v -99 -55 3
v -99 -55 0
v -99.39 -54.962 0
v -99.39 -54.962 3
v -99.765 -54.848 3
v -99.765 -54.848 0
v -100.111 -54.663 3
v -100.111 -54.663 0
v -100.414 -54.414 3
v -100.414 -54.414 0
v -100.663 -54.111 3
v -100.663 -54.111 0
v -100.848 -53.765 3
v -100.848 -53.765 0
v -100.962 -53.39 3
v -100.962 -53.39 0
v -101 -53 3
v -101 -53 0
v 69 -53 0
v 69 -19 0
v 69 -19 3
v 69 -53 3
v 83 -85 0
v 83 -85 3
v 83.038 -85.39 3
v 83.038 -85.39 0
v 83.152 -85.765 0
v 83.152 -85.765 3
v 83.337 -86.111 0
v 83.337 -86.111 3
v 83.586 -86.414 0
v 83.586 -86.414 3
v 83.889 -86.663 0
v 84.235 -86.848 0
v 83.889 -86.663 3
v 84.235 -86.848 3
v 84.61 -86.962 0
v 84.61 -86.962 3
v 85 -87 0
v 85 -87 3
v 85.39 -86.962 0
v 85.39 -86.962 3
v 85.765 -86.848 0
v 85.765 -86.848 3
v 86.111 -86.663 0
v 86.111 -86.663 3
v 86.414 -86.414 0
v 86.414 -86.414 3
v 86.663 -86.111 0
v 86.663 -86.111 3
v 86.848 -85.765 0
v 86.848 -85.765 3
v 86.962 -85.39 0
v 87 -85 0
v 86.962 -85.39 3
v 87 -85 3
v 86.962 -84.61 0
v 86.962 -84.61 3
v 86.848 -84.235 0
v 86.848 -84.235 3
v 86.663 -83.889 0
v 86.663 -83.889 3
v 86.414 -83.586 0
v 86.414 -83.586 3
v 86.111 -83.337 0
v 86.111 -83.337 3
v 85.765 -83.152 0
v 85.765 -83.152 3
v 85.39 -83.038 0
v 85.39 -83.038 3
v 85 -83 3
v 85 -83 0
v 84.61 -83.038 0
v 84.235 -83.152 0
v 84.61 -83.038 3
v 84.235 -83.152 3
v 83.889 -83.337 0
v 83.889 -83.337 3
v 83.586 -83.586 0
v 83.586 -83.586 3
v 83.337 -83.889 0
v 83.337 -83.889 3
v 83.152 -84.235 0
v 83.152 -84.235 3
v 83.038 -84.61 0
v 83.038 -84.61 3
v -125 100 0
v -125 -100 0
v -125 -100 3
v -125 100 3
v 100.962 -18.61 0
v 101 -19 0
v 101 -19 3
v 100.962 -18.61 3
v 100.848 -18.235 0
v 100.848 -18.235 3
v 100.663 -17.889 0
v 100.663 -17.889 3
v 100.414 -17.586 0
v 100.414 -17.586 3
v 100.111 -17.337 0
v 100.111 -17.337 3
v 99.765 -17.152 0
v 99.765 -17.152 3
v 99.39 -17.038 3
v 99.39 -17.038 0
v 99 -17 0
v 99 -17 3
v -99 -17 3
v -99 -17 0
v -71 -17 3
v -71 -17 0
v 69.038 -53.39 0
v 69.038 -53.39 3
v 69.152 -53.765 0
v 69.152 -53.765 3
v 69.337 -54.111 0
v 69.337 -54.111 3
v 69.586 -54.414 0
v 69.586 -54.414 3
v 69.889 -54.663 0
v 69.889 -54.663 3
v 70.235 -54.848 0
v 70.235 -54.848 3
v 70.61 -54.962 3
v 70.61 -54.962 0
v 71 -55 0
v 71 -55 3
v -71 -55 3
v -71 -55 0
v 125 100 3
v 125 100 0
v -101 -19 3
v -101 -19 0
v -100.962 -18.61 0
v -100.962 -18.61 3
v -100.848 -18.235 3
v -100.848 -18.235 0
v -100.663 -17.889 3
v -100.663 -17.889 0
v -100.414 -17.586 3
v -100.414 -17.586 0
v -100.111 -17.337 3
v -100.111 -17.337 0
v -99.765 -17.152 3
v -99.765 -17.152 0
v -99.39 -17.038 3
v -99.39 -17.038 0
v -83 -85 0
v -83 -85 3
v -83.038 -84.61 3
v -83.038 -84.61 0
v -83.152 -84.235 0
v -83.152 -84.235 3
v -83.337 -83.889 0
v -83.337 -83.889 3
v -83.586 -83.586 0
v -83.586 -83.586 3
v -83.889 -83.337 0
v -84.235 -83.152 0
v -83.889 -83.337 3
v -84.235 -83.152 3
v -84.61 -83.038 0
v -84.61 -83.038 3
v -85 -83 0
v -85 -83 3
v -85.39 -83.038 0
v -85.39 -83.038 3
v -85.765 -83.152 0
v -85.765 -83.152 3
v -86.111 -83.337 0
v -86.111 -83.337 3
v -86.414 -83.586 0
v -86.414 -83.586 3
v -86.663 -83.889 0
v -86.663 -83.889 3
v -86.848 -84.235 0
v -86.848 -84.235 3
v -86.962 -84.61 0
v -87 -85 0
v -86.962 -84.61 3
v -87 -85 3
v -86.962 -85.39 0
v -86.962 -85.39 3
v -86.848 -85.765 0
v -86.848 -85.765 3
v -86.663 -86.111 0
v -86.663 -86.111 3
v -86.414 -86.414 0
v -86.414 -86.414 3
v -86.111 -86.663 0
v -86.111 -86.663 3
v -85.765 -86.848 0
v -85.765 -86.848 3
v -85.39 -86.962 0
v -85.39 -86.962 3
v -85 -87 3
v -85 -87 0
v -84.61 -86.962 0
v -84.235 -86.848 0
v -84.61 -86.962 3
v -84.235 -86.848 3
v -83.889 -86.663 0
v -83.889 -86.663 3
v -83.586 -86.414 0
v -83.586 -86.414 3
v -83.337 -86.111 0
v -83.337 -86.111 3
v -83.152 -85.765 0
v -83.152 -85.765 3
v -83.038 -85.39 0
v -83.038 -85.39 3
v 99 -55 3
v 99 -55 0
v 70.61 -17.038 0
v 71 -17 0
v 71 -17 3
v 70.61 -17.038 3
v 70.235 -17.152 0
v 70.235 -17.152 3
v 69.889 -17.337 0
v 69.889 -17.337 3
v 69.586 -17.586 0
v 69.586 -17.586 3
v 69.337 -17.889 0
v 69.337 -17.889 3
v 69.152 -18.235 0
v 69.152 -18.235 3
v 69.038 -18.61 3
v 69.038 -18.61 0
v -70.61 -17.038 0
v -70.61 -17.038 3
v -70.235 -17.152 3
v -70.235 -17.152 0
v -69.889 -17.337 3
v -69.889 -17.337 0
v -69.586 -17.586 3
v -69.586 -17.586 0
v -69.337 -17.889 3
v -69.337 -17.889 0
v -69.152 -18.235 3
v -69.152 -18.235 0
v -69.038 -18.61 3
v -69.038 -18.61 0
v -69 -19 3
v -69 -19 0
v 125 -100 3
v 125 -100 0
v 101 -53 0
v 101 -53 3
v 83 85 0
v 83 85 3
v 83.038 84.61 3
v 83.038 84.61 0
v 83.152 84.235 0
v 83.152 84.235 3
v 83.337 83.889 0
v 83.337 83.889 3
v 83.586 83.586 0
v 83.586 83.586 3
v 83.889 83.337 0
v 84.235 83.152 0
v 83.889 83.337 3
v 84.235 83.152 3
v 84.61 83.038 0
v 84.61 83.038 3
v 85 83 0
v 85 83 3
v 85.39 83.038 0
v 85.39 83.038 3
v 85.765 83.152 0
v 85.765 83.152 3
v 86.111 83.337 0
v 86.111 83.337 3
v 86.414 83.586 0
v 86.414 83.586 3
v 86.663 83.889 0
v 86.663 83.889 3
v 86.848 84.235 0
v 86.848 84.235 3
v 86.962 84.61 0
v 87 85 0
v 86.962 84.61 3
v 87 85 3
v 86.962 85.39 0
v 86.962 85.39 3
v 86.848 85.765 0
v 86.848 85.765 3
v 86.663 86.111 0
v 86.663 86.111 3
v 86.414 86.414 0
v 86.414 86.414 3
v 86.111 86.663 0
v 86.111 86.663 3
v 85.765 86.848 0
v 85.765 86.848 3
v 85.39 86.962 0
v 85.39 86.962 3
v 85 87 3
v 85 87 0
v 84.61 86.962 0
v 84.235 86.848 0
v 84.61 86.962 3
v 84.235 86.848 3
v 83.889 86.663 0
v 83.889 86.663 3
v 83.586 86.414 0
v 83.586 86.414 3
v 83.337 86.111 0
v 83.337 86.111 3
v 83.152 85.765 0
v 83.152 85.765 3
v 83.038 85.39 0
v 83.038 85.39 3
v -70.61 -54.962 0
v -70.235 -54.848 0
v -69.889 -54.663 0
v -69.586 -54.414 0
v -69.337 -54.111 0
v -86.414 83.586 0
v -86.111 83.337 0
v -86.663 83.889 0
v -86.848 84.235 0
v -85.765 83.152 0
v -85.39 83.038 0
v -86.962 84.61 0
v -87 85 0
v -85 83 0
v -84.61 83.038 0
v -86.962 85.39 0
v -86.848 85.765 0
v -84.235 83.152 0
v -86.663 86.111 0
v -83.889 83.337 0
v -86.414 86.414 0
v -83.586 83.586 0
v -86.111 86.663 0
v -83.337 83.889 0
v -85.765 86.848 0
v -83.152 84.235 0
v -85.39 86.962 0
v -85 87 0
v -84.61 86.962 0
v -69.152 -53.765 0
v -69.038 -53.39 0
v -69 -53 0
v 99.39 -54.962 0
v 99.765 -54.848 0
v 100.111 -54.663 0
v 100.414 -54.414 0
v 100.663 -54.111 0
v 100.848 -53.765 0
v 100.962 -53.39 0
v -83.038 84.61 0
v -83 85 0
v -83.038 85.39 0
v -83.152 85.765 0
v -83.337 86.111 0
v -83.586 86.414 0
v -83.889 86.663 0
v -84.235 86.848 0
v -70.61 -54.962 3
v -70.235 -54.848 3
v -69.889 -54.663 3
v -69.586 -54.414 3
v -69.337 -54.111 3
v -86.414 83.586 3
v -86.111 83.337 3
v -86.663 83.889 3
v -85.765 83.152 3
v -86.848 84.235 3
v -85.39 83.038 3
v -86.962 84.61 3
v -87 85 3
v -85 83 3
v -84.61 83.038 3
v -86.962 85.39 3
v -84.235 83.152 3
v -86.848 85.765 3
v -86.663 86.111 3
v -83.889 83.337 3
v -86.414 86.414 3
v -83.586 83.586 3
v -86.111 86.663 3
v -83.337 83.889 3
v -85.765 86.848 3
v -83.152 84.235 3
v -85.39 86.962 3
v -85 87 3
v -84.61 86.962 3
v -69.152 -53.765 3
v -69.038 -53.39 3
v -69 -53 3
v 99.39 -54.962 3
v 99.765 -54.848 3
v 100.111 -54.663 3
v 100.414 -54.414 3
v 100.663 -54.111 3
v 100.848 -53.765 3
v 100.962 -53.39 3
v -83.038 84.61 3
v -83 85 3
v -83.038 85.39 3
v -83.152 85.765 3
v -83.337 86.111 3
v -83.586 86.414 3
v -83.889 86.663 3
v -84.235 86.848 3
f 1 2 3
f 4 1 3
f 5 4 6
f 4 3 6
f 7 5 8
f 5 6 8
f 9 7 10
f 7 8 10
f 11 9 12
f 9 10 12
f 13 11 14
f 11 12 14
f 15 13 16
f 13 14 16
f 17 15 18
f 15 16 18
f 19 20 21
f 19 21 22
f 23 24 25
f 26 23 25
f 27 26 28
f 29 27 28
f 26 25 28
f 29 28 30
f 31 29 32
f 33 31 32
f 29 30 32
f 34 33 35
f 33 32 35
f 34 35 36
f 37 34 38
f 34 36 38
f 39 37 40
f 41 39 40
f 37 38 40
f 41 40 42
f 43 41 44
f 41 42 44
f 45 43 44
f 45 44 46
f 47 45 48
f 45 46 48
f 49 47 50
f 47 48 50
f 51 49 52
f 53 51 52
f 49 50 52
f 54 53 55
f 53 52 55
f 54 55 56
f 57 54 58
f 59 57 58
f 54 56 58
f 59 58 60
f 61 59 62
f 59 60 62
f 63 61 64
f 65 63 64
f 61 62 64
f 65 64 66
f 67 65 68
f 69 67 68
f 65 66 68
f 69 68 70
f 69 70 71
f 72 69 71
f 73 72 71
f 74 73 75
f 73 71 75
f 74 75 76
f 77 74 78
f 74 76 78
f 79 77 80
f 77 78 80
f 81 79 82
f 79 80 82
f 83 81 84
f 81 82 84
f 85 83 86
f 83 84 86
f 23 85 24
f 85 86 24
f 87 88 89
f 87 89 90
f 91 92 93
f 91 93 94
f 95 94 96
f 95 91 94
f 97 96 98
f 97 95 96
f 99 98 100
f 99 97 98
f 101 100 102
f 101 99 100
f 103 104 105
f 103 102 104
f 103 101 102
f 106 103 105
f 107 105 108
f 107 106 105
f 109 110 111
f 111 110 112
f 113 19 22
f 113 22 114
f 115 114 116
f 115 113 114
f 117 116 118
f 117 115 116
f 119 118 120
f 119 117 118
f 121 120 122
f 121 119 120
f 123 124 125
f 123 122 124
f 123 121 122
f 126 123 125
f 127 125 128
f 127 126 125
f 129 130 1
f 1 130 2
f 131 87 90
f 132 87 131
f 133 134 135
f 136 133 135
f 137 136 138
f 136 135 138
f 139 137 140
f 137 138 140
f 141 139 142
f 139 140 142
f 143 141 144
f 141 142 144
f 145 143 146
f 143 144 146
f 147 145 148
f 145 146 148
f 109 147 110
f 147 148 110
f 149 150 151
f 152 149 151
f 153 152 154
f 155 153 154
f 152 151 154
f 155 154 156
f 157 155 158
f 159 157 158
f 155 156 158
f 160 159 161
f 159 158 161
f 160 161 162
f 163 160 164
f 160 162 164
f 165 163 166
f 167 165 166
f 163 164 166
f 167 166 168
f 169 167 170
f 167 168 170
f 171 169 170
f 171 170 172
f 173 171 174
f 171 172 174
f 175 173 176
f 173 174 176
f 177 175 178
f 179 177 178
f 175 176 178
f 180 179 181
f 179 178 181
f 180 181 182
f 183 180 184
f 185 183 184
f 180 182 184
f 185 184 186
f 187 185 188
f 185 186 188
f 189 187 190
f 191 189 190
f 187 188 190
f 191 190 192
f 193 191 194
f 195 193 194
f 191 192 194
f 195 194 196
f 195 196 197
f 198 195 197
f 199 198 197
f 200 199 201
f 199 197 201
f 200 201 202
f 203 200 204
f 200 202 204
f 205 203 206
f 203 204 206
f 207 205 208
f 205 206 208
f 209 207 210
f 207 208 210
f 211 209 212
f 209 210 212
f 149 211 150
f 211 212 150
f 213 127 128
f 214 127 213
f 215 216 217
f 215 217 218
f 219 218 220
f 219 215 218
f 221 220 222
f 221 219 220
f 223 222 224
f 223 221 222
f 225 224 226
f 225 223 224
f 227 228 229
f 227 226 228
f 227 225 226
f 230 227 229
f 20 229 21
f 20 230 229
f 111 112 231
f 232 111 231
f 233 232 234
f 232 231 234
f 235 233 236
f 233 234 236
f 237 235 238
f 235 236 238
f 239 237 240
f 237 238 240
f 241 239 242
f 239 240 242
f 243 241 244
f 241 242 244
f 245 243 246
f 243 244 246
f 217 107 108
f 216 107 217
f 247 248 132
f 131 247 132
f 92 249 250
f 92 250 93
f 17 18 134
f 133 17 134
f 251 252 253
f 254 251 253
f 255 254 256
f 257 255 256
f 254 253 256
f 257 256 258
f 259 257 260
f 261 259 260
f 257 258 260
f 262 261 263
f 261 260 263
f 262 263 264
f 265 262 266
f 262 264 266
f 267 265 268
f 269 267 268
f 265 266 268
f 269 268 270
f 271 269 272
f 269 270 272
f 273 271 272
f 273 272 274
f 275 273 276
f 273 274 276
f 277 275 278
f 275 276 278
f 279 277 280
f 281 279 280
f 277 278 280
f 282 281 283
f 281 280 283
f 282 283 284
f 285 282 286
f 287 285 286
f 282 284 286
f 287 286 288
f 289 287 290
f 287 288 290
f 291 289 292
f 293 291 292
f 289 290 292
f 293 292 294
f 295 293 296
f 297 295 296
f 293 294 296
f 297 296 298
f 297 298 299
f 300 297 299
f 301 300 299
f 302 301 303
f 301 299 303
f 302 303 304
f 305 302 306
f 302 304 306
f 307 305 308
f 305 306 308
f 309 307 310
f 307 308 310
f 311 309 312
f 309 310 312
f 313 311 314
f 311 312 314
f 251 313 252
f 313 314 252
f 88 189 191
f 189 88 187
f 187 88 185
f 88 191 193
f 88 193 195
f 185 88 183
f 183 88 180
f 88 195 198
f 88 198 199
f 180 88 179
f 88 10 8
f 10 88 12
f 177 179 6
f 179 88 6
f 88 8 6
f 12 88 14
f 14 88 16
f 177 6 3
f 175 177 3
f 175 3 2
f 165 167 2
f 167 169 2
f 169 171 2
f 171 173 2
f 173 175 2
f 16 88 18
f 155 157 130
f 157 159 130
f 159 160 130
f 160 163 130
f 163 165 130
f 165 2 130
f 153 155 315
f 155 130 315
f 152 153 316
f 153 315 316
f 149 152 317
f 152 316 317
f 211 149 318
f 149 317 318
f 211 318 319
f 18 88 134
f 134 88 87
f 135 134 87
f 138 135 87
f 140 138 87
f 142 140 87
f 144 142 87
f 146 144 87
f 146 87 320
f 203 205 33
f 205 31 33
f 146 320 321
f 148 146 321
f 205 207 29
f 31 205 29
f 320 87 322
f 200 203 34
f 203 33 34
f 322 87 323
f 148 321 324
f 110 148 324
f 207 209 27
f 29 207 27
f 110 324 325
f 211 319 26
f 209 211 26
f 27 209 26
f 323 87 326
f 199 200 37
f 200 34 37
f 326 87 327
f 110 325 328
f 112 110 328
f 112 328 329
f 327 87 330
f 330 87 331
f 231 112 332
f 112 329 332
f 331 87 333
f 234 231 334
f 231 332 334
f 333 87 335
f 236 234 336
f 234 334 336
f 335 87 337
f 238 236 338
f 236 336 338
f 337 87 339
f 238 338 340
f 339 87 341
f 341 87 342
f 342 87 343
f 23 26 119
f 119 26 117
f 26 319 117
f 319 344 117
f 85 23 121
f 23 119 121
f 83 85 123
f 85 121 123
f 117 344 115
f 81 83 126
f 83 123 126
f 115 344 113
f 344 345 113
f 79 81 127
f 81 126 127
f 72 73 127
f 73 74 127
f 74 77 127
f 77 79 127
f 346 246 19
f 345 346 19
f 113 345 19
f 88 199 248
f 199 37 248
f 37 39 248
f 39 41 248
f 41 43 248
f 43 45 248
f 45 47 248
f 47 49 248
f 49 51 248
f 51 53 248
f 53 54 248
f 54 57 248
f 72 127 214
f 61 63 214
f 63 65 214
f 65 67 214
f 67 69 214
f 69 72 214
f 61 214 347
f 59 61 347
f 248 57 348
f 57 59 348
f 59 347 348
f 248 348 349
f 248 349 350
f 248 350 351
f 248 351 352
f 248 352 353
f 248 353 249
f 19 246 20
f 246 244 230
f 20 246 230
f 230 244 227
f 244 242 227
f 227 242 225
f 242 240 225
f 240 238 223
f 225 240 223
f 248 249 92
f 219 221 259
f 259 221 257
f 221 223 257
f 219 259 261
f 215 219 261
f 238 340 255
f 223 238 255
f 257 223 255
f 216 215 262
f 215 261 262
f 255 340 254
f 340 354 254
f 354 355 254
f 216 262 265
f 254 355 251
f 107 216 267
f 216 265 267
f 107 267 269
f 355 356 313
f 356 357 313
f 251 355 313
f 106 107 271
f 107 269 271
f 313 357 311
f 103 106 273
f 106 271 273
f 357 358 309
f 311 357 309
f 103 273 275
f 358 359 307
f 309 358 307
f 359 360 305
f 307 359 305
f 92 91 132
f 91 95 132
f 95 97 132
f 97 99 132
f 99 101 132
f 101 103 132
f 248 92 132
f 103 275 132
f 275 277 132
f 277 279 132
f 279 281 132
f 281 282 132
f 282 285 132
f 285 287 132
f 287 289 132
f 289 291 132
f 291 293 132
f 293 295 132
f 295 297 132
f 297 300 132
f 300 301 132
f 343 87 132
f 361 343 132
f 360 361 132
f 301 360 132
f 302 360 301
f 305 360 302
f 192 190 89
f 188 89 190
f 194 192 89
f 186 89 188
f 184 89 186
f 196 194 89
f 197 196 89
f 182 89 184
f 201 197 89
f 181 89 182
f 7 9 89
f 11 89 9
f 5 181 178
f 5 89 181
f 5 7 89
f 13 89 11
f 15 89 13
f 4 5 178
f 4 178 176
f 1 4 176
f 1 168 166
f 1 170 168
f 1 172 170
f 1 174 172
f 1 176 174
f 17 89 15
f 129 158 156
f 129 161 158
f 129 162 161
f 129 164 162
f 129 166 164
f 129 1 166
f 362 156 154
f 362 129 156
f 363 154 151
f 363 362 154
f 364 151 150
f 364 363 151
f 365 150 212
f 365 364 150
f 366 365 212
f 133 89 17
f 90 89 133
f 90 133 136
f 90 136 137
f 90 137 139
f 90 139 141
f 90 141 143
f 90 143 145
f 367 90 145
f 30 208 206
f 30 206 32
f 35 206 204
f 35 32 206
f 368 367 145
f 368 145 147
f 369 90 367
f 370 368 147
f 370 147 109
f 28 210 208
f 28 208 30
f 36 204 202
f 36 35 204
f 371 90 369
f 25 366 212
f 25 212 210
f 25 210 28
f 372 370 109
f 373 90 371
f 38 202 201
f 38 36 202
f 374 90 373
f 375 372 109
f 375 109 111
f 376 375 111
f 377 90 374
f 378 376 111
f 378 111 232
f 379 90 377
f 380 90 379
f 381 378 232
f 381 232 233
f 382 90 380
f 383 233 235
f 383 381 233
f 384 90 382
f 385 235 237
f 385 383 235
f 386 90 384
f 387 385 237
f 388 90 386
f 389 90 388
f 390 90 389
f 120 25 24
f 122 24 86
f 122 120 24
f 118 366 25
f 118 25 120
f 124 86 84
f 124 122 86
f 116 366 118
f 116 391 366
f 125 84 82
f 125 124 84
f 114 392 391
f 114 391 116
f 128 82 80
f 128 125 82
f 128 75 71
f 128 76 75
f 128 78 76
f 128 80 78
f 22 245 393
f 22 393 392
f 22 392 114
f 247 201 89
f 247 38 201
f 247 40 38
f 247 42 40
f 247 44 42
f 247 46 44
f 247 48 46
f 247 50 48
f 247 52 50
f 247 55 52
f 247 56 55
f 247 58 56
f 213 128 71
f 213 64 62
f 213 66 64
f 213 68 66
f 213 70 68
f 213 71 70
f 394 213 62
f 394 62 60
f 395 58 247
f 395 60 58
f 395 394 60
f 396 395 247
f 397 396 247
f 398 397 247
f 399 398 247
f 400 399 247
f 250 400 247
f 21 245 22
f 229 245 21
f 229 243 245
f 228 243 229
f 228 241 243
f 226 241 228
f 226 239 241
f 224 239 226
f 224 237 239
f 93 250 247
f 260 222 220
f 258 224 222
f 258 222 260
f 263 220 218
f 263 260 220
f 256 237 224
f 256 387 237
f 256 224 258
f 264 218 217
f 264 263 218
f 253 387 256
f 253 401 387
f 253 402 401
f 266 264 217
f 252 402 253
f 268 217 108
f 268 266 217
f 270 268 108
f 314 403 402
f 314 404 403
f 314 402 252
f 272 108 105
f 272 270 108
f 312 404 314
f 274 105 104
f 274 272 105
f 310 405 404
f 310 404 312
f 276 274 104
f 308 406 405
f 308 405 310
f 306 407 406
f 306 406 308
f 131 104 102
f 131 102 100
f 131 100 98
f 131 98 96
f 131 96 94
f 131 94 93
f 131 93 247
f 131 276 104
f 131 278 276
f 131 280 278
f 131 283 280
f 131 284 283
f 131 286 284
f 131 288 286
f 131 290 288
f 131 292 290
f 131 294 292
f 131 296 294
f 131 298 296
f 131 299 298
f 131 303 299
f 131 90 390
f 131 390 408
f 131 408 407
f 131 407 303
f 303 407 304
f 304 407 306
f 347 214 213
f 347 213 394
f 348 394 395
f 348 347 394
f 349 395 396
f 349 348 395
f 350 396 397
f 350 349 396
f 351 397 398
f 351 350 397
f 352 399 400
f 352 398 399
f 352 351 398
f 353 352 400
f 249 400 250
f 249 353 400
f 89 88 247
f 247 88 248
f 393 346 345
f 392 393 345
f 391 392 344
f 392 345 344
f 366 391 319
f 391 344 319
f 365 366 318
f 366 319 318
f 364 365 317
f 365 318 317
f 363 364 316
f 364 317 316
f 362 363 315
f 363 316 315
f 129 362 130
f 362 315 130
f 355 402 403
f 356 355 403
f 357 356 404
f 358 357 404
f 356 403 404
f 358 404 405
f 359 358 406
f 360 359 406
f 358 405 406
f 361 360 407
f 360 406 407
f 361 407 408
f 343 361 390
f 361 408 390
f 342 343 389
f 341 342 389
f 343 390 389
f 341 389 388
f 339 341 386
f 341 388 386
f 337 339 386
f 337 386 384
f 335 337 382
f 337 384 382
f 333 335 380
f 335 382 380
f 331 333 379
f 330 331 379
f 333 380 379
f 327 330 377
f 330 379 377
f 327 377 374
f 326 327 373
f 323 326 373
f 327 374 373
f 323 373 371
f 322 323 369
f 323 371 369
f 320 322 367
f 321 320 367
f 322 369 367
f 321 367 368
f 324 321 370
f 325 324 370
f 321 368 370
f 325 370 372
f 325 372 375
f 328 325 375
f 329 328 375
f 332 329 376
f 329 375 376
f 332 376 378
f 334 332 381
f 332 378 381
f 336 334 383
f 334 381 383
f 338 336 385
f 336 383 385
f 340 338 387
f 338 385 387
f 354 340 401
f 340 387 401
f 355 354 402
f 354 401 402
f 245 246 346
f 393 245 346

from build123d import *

# Parameters (mm, degrees)
SKETCH1_W           = 250
SKETCH1_H           = 200
BOSS_EXTRUDE1_DEPTH = 3
SKETCH3_R           = 2
CUT_EXTRUDE2_DEPTH  = 3
CUT_EXTRUDE3_DEPTH  = 10


with BuildPart() as part:
    # Sketch1 → Boss-Extrude1 (new body)
    with BuildSketch(Plane.XY):
        Rectangle(SKETCH1_W, SKETCH1_H)
    extrude(amount=BOSS_EXTRUDE1_DEPTH)

    # Sketch3 → Cut-Extrude2 (cut)
    with BuildSketch(Plane.XY.offset(3)):
        with Locations((-85, 85)):
            Circle(SKETCH3_R)
        with Locations((-85, -85)):
            Circle(SKETCH3_R)
        with Locations((-85, -425)):
            Circle(SKETCH3_R)
        with Locations((85, -425)):
            Circle(SKETCH3_R)
        with Locations(Location((85, -85, 0), (0, 0, 180))):
            Circle(SKETCH3_R)
        with Locations(Location((85, 85, 0), (0, 0, 180))):
            Circle(SKETCH3_R)
    extrude(amount=-CUT_EXTRUDE2_DEPTH, mode=Mode.SUBTRACT)

    # Sketch4 → Cut-Extrude3 (cut)
    with BuildSketch(Plane(origin=(0, 0, 0), x_dir=(-1, 0, 0), z_dir=(0, 0, -1))):
        with BuildLine():
            Line((-99, -17), (-71, -17))
            ThreePointArc((-71, -17), (-69.585786438, -17.585786438), (-69, -19))
            Line((-69, -19), (-69, -53))
            ThreePointArc((-69, -53), (-69.585786438, -54.414213562), (-71, -55))
            Line((-71, -55), (-99, -55))
            ThreePointArc((-99, -55), (-100.414213562, -54.414213562), (-101, -53))
            Line((-101, -53), (-101, -19))
            ThreePointArc((-101, -19), (-100.414213562, -17.585786438), (-99, -17))
        make_face()
        with BuildLine():
            Line((69, -19), (69, -53))
            ThreePointArc((69, -53), (69.585786438, -54.414213562), (71, -55))
            Line((71, -55), (99, -55))
            ThreePointArc((99, -55), (100.414213562, -54.414213562), (101, -53))
            Line((101, -53), (101, -19))
            ThreePointArc((101, -19), (100.414213562, -17.585786438), (99, -17))
            Line((99, -17), (71, -17))
            ThreePointArc((71, -17), (69.585786438, -17.585786438), (69, -19))
        make_face()
    extrude(amount=-CUT_EXTRUDE3_DEPTH, mode=Mode.SUBTRACT)


solid = part.part
